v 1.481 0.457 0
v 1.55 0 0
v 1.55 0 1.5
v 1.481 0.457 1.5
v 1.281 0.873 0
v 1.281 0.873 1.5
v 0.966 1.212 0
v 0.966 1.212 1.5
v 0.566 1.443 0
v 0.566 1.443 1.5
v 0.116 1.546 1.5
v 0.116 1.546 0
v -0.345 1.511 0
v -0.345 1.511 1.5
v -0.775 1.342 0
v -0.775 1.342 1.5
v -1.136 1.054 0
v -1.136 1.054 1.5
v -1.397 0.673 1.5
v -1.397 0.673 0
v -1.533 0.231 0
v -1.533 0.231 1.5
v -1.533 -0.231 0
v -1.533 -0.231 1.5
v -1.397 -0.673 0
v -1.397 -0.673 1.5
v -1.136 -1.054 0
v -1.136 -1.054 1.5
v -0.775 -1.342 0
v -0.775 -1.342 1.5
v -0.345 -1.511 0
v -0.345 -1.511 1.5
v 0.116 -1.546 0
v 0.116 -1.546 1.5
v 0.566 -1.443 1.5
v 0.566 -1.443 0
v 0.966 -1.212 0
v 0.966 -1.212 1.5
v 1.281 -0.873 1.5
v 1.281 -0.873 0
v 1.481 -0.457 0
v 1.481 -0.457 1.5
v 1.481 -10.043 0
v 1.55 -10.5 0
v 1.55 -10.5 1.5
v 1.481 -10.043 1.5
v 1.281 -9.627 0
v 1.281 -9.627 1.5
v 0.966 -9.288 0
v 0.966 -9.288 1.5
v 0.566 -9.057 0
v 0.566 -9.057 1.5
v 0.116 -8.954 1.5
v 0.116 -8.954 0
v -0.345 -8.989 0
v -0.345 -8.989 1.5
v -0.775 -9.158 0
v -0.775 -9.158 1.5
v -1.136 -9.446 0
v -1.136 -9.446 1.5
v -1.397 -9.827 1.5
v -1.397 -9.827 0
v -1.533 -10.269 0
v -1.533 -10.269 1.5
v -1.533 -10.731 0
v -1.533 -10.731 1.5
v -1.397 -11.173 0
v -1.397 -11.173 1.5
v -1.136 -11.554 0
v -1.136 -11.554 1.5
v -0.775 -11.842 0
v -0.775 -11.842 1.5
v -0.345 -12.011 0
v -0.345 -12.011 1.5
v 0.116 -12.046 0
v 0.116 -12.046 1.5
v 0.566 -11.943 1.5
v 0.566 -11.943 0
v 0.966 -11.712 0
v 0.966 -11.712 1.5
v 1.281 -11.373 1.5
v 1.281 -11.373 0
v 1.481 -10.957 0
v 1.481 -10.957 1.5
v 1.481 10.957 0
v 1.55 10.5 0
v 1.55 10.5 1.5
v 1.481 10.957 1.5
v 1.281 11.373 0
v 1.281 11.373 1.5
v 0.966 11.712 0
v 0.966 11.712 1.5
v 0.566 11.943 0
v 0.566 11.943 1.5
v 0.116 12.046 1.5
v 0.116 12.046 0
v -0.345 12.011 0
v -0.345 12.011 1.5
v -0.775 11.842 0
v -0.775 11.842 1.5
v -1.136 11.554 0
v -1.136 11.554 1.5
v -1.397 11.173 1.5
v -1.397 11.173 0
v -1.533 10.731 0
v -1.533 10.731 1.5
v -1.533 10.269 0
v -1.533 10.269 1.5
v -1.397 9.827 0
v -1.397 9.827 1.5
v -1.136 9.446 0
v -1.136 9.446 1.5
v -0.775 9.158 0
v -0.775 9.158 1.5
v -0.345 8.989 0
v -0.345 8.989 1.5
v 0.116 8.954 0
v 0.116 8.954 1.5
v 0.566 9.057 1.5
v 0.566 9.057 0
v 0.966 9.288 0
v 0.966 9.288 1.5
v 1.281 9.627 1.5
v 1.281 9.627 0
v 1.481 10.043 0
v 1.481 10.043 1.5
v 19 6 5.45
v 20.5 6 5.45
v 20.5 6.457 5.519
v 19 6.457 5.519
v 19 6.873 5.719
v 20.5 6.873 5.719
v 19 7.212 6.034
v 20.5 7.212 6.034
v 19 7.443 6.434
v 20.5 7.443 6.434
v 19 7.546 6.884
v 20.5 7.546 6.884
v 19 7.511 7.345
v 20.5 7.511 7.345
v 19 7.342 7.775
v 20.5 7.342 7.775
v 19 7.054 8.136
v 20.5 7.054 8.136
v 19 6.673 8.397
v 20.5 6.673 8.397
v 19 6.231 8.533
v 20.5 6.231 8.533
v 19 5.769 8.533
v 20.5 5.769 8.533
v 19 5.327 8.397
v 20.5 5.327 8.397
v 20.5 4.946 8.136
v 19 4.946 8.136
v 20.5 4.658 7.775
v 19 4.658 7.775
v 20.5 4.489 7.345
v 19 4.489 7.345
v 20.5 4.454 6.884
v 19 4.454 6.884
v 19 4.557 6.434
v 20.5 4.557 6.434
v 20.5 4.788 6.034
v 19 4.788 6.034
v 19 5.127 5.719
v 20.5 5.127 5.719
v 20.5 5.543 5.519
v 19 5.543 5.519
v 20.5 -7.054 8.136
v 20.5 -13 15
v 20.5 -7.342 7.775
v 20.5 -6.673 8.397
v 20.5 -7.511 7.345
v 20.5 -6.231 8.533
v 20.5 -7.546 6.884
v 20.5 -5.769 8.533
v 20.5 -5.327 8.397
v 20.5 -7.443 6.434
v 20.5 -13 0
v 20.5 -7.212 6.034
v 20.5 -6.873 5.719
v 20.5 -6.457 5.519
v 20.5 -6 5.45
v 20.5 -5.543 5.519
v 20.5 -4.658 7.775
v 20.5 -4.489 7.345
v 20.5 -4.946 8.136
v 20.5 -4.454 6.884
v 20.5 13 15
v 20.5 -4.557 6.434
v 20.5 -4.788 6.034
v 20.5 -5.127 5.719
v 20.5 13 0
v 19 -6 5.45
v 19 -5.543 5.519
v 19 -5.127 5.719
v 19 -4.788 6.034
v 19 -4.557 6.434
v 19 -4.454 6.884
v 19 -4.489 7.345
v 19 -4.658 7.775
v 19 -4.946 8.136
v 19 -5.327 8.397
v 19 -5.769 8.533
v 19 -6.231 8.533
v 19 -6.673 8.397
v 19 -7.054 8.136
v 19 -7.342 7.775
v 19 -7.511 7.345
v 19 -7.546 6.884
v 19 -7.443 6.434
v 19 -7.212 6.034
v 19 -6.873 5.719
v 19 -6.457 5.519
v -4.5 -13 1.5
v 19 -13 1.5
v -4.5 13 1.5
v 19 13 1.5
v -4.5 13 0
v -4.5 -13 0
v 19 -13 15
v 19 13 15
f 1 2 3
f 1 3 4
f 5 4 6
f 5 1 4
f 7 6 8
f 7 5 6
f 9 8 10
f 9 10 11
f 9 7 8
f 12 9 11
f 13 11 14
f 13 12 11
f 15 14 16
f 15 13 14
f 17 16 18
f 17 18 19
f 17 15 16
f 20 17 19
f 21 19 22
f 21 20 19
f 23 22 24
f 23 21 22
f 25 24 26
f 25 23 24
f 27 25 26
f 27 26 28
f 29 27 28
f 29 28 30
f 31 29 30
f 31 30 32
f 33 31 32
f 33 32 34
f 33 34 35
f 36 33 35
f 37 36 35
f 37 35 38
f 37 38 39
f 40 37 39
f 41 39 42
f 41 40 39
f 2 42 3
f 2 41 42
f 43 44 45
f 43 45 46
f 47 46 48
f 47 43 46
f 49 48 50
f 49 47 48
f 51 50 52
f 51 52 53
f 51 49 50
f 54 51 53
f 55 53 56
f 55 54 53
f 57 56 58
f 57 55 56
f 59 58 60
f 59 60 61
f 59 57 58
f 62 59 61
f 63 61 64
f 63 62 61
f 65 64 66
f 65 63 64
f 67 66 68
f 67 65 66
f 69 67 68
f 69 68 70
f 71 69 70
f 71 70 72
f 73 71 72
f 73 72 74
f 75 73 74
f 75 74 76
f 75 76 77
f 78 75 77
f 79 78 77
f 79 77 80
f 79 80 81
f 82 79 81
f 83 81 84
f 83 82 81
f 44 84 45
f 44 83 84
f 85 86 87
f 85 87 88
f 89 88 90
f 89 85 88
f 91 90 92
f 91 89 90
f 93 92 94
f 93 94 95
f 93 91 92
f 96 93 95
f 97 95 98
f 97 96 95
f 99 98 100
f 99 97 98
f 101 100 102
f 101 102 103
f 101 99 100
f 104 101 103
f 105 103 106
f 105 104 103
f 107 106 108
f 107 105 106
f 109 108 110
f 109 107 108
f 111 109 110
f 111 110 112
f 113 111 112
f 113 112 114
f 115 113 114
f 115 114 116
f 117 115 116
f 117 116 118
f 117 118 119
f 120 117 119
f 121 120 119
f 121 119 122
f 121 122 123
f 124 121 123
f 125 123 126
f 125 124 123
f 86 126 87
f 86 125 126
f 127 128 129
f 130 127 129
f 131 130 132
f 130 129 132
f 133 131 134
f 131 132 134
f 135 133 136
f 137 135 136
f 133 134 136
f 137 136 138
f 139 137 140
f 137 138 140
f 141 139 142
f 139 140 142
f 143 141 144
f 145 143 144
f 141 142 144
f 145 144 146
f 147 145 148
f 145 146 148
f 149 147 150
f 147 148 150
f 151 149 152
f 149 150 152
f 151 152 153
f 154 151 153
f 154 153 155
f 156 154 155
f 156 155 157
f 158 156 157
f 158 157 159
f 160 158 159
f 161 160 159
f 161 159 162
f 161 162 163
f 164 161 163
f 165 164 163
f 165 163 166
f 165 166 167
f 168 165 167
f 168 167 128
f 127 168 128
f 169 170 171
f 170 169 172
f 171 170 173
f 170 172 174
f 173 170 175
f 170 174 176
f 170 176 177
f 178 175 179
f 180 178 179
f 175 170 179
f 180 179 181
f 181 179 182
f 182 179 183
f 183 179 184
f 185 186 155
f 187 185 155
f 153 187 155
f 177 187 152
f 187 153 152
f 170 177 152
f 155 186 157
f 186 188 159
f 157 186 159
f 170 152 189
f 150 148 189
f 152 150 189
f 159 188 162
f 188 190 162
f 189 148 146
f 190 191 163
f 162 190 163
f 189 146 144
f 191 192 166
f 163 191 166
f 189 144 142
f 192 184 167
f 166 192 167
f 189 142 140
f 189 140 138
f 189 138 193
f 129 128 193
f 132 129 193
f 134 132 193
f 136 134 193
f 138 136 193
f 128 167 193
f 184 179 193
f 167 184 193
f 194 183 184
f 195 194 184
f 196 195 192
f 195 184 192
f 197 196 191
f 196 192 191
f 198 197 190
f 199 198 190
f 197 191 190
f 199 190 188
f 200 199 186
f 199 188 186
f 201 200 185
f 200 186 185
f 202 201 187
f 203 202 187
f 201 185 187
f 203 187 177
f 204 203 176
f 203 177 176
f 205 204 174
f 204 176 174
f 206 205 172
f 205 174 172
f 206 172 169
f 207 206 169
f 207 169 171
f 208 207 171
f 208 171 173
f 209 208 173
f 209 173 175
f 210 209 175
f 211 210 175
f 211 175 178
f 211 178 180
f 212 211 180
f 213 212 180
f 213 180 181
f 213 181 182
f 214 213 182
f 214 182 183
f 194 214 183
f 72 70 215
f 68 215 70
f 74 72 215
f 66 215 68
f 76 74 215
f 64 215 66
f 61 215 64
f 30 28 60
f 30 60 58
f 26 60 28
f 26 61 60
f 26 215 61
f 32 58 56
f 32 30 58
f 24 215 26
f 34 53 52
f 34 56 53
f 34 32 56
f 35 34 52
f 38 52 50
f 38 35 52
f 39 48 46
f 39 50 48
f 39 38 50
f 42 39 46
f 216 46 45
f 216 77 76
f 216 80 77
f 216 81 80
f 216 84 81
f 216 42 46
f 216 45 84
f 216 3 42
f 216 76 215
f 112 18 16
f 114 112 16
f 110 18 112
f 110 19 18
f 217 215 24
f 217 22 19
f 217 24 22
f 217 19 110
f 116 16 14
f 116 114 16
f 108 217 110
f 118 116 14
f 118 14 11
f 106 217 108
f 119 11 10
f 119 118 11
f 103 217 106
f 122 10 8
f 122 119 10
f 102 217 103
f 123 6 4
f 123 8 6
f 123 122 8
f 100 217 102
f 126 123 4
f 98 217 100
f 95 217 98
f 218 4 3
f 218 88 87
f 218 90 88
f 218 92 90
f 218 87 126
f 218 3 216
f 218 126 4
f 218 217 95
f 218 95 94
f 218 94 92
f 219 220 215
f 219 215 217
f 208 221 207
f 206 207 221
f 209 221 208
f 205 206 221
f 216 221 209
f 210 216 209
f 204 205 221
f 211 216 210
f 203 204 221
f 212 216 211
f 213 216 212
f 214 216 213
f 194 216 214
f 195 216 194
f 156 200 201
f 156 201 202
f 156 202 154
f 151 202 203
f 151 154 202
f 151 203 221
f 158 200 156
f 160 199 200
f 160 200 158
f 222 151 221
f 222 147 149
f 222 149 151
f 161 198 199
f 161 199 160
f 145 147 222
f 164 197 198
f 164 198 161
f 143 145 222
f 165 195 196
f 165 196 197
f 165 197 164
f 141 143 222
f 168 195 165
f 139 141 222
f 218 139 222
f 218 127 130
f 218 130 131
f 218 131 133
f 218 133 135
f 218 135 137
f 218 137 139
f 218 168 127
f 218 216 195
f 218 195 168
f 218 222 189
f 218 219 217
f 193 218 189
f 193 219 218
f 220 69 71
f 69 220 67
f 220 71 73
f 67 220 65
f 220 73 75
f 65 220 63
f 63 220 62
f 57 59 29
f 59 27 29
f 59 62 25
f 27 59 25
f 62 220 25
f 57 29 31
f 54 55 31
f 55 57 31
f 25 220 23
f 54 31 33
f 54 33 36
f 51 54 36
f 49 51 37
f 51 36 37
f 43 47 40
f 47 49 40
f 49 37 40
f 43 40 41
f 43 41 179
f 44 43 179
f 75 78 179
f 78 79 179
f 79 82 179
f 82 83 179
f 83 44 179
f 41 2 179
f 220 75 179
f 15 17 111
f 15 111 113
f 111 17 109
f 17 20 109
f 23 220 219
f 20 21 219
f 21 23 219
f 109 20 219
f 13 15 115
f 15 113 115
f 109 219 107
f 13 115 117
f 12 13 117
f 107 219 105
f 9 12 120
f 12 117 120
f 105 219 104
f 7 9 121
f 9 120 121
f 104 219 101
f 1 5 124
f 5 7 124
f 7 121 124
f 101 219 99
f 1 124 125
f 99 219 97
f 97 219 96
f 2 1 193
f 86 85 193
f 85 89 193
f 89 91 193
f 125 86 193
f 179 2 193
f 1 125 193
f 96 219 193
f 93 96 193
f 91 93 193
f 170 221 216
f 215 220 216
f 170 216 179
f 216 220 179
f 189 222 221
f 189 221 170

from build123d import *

# Parameters (mm, degrees)
SKETCH1_W           = 25
SKETCH1_H           = 26
SKETCH1_R           = 1.55
BOSS_EXTRUDE1_DEPTH = 1.5
SKETCH2_W           = 1.5
SKETCH2_H           = 26
BOSS_EXTRUDE2_DEPTH = 13.5
SKETCH3_R           = 1.55
CUT_EXTRUDE1_DEPTH  = 13


with BuildPart() as part:
    # Sketch1 → Boss-Extrude1 (new body)
    with BuildSketch(Plane.XY):
        with Locations((8, 0)):
            Rectangle(SKETCH1_W, SKETCH1_H)
        with Locations((0, 10.5)):
            Circle(SKETCH1_R, mode=Mode.SUBTRACT)
        Circle(SKETCH1_R, mode=Mode.SUBTRACT)
        with Locations((0, -10.5)):
            Circle(SKETCH1_R, mode=Mode.SUBTRACT)
    extrude(amount=BOSS_EXTRUDE1_DEPTH)

    # Sketch2 → Boss-Extrude2 (add)
    with BuildSketch(Plane.XY.offset(1.5)):
        with Locations((19.75, 0)):
            Rectangle(SKETCH2_W, SKETCH2_H)
    extrude(amount=BOSS_EXTRUDE2_DEPTH)

    # Sketch3 → Cut-Extrude1 (cut)
    with BuildSketch(Plane(origin=(20.5, 0, 0), x_dir=(0, 0, -1), z_dir=(1, 0, 0))):
        with Locations((-7, 6)):
            Circle(SKETCH3_R)
        with Locations((-7, -6)):
            Circle(SKETCH3_R)
    extrude(amount=-CUT_EXTRUDE1_DEPTH, mode=Mode.SUBTRACT)


solid = part.part
